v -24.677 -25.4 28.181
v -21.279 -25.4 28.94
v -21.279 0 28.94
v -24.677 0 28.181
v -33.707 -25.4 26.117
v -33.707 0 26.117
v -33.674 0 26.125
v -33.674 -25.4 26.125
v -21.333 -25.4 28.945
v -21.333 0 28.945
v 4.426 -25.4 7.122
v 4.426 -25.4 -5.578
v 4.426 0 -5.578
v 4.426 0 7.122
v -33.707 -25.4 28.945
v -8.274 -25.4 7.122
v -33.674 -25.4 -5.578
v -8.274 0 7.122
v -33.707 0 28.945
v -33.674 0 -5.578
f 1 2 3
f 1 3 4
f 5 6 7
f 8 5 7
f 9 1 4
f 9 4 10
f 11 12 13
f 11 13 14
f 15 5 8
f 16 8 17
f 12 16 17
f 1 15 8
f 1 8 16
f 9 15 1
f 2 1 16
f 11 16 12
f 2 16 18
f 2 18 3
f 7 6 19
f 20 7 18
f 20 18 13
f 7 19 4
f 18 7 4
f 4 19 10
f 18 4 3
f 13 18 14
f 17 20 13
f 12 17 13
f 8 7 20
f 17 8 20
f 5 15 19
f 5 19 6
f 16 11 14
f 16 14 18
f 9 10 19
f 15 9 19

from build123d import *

# Parameters (mm, degrees)
F1_DEPTH = 25.4
F2_DEPTH = 25.4
F4_DEPTH = 25.4
F5_DEPTH = 25.4


with BuildPart() as f1:
    # F0 (on Front) → F1 (new body)
    with BuildSketch(Plane.XZ):
        Polygon((-21.2792549282, 28.9397872984), (-33.6739535907, 26.1718557484), (-33.6739535907, -5.5781442516), (4.4260464093, -5.5781442516), (4.4260464093, 7.1218557484), (-8.2739535907, 7.1218557484), align=None)
    extrude(amount=F1_DEPTH)

    # F2 (add): a face of the model
    f2_faces = [f1.faces().sort_by_distance(p)[0] for p in [
        (-18.6613811505, -25.4, 7.7485425126),
    ]]
    extrude(f2_faces, amount=F2_DEPTH)

    # F3 (on Front) → F4 (join)
    with BuildSketch(Plane.XZ):
        Polygon((-33.7073244154, 26.1170342565), (-21.333374083, 28.9452429861), (-33.7073244154, 28.9452429861), align=None)
    extrude(amount=F4_DEPTH)

    # F5 (cut): a face of the model
    f5_faces = [f1.faces().sort_by_distance(p)[0] for p in [
        (-18.6613811505, -50.8, 7.7485425126),
    ]]
    extrude(f5_faces, amount=-F5_DEPTH, mode=Mode.SUBTRACT)


solid = f1.part
